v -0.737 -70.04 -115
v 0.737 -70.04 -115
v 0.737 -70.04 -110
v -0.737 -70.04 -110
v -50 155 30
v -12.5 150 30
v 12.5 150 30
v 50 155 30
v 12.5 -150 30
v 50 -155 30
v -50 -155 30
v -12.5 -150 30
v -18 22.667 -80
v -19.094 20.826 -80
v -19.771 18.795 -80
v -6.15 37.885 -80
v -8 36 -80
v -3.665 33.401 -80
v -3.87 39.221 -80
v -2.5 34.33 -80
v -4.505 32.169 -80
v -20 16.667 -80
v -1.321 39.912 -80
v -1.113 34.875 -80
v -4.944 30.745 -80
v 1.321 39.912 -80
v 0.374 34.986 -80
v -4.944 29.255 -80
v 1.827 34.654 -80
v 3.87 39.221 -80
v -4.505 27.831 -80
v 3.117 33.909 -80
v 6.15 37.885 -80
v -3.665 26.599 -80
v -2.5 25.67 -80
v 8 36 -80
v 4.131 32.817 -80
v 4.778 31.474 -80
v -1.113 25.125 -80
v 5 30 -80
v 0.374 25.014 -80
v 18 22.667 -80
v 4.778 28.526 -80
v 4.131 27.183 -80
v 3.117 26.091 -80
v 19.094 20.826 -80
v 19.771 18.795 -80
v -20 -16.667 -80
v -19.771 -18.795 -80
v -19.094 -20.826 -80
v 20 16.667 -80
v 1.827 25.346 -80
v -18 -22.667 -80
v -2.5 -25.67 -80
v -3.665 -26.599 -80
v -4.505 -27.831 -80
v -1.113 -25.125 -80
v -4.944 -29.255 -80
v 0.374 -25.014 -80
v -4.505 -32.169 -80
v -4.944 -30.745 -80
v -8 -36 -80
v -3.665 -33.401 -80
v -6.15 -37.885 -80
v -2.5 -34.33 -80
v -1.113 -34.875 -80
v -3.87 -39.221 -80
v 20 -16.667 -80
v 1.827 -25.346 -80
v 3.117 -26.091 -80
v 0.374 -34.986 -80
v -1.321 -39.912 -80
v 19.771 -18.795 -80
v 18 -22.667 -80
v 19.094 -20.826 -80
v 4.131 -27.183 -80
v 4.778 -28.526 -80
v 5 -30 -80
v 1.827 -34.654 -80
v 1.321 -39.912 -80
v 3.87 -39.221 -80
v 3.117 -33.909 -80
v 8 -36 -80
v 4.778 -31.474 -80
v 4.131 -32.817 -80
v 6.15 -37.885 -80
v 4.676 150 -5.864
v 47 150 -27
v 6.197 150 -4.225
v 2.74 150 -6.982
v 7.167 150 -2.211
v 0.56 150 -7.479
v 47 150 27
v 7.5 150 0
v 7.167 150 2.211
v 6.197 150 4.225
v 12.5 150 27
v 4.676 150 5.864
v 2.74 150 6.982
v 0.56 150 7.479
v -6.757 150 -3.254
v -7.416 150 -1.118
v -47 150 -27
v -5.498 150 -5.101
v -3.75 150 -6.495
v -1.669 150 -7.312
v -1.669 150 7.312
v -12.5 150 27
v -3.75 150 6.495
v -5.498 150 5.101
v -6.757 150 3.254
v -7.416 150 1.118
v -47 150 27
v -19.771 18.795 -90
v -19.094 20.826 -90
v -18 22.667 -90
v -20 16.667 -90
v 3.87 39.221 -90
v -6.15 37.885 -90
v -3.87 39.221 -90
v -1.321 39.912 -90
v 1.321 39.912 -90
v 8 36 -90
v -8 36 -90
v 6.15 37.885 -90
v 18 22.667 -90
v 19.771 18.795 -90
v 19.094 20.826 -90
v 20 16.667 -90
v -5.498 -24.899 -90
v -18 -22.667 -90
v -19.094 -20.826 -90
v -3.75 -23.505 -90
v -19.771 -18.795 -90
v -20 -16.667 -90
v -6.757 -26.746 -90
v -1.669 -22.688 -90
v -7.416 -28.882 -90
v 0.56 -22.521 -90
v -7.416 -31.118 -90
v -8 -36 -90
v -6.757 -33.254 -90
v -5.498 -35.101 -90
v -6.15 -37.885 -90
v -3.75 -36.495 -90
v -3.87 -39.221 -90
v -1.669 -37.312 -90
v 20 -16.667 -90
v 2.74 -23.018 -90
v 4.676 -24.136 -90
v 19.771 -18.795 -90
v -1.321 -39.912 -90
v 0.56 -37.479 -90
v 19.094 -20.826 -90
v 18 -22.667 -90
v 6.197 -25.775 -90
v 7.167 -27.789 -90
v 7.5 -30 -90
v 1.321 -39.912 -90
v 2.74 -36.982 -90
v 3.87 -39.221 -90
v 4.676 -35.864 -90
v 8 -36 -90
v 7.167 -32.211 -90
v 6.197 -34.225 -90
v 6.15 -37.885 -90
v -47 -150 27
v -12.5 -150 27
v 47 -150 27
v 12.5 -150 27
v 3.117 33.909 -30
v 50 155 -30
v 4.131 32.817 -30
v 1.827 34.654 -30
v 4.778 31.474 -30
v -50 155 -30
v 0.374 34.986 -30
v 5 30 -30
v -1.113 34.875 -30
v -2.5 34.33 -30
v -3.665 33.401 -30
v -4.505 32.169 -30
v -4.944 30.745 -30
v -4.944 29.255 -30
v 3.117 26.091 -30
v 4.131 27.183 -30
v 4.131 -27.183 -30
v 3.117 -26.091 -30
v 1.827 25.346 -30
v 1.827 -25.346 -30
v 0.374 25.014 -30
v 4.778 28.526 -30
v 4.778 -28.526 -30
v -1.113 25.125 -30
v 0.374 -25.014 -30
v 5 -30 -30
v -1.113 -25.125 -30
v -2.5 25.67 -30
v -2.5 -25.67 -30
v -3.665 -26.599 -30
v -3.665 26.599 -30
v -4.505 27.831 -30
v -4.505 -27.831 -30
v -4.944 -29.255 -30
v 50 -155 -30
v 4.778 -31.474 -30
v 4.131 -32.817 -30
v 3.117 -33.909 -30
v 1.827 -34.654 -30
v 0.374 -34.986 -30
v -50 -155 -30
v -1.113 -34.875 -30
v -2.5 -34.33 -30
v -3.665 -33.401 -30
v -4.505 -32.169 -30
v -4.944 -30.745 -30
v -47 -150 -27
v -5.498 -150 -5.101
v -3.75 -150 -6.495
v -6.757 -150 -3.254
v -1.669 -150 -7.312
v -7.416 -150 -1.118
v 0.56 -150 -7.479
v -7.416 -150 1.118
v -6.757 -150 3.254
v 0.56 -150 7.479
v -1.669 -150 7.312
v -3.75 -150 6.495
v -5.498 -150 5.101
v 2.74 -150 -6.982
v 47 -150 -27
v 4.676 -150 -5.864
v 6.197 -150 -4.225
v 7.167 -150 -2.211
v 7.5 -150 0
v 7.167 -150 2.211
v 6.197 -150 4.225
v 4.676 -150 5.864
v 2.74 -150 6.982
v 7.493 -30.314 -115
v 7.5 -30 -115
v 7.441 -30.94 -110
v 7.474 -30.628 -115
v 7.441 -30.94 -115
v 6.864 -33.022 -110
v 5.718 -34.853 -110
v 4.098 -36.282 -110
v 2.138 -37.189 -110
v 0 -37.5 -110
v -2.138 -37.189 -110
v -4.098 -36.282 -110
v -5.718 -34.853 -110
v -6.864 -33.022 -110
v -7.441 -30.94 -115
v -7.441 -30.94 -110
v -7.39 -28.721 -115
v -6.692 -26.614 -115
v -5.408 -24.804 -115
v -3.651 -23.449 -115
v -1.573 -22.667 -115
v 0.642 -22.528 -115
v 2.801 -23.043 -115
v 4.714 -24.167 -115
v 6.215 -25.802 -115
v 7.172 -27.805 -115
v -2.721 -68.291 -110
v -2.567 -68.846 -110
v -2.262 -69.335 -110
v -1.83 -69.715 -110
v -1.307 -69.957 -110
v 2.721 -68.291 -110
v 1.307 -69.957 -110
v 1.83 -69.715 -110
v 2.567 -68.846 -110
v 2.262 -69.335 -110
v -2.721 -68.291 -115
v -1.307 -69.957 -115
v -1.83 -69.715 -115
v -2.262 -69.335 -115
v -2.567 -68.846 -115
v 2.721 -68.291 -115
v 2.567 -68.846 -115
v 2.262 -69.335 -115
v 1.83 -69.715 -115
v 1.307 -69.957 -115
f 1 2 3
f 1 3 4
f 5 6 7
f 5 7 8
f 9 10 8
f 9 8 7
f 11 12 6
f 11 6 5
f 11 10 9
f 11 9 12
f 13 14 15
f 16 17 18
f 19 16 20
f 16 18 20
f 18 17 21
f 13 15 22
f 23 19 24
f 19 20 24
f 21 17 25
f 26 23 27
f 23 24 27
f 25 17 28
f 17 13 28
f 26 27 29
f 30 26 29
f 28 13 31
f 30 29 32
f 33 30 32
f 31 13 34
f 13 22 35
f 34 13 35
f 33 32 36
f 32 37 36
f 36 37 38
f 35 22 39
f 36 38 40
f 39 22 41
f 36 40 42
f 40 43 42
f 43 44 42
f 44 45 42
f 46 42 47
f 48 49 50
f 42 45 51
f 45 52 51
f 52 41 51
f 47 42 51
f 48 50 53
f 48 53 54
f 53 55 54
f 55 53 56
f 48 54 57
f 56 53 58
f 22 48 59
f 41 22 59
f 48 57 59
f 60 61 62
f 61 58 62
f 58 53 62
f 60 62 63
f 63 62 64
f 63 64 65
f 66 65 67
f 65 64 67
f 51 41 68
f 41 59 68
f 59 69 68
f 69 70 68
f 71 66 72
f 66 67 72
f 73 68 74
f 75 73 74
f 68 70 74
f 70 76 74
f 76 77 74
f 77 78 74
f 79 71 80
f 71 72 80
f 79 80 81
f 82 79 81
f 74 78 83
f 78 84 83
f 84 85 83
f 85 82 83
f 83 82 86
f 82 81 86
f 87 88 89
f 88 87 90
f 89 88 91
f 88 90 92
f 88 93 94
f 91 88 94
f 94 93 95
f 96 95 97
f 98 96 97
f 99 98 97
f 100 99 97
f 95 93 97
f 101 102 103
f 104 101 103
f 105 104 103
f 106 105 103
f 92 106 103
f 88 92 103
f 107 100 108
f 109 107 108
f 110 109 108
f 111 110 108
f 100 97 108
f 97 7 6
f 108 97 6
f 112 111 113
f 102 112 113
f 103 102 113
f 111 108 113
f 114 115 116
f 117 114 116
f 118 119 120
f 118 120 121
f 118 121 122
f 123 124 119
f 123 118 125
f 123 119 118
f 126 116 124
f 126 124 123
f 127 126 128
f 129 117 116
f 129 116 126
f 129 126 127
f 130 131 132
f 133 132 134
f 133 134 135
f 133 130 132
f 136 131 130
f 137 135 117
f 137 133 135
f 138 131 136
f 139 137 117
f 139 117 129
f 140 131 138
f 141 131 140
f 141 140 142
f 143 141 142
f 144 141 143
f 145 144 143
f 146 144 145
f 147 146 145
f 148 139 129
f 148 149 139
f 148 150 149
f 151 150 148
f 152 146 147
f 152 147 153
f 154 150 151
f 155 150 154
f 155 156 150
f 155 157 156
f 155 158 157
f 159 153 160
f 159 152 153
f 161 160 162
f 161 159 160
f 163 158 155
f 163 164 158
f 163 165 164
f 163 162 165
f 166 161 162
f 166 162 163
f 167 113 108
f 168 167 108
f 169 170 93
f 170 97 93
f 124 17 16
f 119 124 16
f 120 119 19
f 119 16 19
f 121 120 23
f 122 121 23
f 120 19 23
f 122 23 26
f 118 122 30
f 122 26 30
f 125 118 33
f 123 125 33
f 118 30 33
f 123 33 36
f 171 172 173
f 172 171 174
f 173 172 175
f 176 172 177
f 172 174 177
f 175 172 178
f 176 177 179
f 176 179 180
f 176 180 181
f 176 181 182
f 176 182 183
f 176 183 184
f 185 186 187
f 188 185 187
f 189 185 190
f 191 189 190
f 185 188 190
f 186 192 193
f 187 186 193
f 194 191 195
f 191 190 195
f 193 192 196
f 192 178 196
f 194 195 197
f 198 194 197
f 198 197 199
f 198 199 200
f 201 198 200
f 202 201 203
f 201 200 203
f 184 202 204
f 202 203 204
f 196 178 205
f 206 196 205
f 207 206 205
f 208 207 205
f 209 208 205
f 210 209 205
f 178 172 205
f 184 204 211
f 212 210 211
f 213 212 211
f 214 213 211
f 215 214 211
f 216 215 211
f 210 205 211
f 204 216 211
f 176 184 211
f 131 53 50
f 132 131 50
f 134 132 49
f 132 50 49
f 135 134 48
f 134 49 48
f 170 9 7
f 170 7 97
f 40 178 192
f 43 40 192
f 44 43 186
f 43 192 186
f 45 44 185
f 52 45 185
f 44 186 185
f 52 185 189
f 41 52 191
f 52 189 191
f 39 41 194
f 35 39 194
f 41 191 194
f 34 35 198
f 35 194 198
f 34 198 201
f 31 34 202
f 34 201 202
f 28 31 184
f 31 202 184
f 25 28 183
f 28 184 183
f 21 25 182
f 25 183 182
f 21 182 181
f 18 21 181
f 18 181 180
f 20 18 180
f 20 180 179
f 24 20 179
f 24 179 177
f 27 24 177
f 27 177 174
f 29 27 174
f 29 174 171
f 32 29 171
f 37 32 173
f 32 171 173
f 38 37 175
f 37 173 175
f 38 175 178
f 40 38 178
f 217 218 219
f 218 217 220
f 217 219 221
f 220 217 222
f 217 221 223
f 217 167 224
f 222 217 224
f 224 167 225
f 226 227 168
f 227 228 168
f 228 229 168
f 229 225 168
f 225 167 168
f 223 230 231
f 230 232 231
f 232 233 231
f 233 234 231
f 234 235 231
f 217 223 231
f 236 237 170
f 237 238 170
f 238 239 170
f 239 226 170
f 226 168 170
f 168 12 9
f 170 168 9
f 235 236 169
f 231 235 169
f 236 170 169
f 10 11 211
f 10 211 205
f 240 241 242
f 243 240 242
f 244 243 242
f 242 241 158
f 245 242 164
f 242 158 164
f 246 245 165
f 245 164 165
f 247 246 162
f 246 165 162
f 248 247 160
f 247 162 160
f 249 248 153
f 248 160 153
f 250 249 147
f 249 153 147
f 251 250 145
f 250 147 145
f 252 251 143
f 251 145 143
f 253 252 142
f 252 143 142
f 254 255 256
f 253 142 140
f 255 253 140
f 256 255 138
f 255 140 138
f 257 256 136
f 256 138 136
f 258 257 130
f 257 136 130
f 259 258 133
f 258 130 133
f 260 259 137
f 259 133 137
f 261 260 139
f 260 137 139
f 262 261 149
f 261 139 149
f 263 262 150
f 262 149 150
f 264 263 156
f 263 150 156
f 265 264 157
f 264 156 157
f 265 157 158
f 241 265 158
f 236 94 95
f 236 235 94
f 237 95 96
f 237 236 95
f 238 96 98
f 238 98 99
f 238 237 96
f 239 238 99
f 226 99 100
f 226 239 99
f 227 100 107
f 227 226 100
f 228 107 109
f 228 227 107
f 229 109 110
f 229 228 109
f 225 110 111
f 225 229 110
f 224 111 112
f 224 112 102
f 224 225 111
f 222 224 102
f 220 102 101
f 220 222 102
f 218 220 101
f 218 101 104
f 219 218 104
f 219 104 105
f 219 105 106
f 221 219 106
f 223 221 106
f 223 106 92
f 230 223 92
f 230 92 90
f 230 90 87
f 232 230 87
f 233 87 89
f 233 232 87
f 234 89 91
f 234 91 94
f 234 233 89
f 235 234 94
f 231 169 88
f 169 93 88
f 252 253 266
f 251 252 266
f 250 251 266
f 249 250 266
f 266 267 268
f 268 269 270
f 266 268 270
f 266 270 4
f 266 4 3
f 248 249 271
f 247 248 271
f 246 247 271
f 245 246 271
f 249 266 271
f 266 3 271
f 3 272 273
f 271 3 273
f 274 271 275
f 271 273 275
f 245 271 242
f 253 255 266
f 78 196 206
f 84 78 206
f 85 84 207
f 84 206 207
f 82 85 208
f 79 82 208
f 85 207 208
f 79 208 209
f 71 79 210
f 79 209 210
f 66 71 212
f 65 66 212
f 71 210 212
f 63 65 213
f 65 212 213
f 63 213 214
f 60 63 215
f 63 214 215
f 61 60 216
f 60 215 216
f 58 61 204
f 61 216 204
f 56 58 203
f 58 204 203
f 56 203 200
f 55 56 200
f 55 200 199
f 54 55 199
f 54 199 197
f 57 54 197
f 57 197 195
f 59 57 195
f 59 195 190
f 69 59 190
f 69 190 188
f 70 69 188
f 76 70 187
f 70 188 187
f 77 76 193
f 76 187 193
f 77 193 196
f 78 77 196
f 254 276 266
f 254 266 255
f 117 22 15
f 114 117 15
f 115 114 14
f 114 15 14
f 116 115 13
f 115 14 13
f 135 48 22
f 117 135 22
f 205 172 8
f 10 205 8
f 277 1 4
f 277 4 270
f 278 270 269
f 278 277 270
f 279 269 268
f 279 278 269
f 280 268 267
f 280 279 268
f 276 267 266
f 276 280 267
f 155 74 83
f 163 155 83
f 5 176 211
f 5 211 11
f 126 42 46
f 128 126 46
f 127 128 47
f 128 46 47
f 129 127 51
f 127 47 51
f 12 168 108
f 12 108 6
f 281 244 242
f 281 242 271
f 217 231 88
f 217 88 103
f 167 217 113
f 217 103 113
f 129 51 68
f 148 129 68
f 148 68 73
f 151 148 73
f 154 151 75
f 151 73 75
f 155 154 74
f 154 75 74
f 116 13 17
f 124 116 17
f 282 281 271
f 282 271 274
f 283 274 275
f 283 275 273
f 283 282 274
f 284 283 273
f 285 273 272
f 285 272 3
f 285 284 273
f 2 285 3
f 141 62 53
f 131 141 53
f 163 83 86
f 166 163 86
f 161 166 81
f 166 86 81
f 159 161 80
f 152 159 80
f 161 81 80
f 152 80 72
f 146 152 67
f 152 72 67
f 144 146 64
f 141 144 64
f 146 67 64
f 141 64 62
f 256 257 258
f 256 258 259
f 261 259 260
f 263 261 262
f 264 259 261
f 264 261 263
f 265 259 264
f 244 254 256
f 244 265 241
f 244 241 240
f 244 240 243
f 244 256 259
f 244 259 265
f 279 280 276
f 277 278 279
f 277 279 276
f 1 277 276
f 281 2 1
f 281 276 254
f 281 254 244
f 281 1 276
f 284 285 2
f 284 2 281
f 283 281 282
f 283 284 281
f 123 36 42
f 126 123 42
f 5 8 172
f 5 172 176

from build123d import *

# Parameters (mm, degrees)
F0_R      = 7.5
F1_DEPTH  = 150
F2_W      = 100
F2_H      = 60
F3_DEPTH  = 5
F4_DEPTH  = 5
F5_W      = 100
F5_H      = 60
F6_DEPTH  = 5
F7_R      = 5
F8_DEPTH  = 50
F9_R      = 5
F10_DEPTH = 10
F11_R     = 7.5
F12_DEPTH = 25
F14_DEPTH = 5


with BuildPart() as f1:
    # F0 (on Front) → F1 (new body, symmetric)
    with BuildSketch(Plane.XZ):
        Polygon((-12.5, 30), (-50, 30), (-50, -30), (50, -30), (50, 30), (12.5, 30), (12.5, 27), (47, 27), (47, -27), (-47, -27), (-47, 27), (-12.5, 27), align=None)
        Circle(F0_R)
    extrude(amount=F1_DEPTH, both=True)

    # F2 (on face) → F3 (join)
    with BuildSketch(Plane.XZ.offset(150)):
        Rectangle(F2_W, F2_H)
    extrude(amount=F3_DEPTH)

    # F2 (on face) → F4 (join)
    with BuildSketch(Plane.XZ.offset(150)):
        Rectangle(F2_W, F2_H)
    extrude(amount=F4_DEPTH)

    # F5 (on face) → F6 (join)
    with BuildSketch(Plane(origin=(0, 150, 0), x_dir=(-1, 0, 0), z_dir=(0, 1, 0))):
        Rectangle(F5_W, F5_H)
    extrude(amount=F6_DEPTH)

    # F7 (on face) → F8 (join)
    with BuildSketch(Plane(origin=(0, 0, -30), x_dir=(1, 0, 0), z_dir=(0, 0, -1))):
        with Locations((0, 30)):
            Circle(F7_R)
        with Locations((0, -30)):
            Circle(F7_R)
    extrude(amount=F8_DEPTH)

    # F9 (on face) → F10 (join)
    with BuildSketch(Plane(origin=(0, 0, -80), x_dir=(1, 0, 0), z_dir=(0, 0, -1))):
        with BuildLine():
            Line((18, 22.666667), (8, 36))
            ThreePointArc((8, 36), (0, 40), (-8, 36))
            Line((-8, 36), (-18, 22.666667))
            ThreePointArc((-18, 22.666667), (-19.486833, 19.828944), (-20, 16.666667))
            Line((-20, 16.666667), (-20, -16.666667))
            ThreePointArc((-20, -16.666667), (-19.486833, -19.828944), (-18, -22.666667))
            Line((-18, -22.666667), (-8, -36))
            ThreePointArc((-8, -36), (0, -40), (8, -36))
            Line((8, -36), (18, -22.666667))
            ThreePointArc((18, -22.666667), (19.486833, -19.828944), (20, -16.666667))
            Line((20, -16.666667), (20, 16.666667))
            ThreePointArc((20, 16.666667), (19.486833, 19.828944), (18, 22.666667))
        make_face()
        with Locations((0, 30)):
            Circle(F9_R, mode=Mode.SUBTRACT)
        with Locations((0, 30)):
            Circle(F9_R)
    extrude(amount=F10_DEPTH)

    # F11 (on face) → F12 (join)
    with BuildSketch(Plane(origin=(0, 0, -90), x_dir=(1, 0, 0), z_dir=(0, 0, -1))):
        with Locations((0, 30)):
            Circle(F11_R)
    extrude(amount=F12_DEPTH)

    # F13 (on face) → F14 (join)
    with BuildSketch(Plane(origin=(0, 0, -115), x_dir=(1, 0, 0), z_dir=(0, 0, -1))):
        with BuildLine():
            Line((-2.721043, 68.291105), (-7.440829, 30.940249))
            ThreePointArc((-7.440829, 30.940249), (0, 22.5), (7.440829, 30.940249))
            Line((7.440829, 30.940249), (2.721043, 68.291105))
            ThreePointArc((2.721043, 68.291105), (2.059421, 69.540617), (0.736823, 70.040372))
            Line((0.736823, 70.040372), (-0.736823, 70.040372))
            ThreePointArc((-0.736823, 70.040372), (-2.059421, 69.540617), (-2.721043, 68.291105))
        make_face()
    extrude(amount=-F14_DEPTH)


solid = f1.part
